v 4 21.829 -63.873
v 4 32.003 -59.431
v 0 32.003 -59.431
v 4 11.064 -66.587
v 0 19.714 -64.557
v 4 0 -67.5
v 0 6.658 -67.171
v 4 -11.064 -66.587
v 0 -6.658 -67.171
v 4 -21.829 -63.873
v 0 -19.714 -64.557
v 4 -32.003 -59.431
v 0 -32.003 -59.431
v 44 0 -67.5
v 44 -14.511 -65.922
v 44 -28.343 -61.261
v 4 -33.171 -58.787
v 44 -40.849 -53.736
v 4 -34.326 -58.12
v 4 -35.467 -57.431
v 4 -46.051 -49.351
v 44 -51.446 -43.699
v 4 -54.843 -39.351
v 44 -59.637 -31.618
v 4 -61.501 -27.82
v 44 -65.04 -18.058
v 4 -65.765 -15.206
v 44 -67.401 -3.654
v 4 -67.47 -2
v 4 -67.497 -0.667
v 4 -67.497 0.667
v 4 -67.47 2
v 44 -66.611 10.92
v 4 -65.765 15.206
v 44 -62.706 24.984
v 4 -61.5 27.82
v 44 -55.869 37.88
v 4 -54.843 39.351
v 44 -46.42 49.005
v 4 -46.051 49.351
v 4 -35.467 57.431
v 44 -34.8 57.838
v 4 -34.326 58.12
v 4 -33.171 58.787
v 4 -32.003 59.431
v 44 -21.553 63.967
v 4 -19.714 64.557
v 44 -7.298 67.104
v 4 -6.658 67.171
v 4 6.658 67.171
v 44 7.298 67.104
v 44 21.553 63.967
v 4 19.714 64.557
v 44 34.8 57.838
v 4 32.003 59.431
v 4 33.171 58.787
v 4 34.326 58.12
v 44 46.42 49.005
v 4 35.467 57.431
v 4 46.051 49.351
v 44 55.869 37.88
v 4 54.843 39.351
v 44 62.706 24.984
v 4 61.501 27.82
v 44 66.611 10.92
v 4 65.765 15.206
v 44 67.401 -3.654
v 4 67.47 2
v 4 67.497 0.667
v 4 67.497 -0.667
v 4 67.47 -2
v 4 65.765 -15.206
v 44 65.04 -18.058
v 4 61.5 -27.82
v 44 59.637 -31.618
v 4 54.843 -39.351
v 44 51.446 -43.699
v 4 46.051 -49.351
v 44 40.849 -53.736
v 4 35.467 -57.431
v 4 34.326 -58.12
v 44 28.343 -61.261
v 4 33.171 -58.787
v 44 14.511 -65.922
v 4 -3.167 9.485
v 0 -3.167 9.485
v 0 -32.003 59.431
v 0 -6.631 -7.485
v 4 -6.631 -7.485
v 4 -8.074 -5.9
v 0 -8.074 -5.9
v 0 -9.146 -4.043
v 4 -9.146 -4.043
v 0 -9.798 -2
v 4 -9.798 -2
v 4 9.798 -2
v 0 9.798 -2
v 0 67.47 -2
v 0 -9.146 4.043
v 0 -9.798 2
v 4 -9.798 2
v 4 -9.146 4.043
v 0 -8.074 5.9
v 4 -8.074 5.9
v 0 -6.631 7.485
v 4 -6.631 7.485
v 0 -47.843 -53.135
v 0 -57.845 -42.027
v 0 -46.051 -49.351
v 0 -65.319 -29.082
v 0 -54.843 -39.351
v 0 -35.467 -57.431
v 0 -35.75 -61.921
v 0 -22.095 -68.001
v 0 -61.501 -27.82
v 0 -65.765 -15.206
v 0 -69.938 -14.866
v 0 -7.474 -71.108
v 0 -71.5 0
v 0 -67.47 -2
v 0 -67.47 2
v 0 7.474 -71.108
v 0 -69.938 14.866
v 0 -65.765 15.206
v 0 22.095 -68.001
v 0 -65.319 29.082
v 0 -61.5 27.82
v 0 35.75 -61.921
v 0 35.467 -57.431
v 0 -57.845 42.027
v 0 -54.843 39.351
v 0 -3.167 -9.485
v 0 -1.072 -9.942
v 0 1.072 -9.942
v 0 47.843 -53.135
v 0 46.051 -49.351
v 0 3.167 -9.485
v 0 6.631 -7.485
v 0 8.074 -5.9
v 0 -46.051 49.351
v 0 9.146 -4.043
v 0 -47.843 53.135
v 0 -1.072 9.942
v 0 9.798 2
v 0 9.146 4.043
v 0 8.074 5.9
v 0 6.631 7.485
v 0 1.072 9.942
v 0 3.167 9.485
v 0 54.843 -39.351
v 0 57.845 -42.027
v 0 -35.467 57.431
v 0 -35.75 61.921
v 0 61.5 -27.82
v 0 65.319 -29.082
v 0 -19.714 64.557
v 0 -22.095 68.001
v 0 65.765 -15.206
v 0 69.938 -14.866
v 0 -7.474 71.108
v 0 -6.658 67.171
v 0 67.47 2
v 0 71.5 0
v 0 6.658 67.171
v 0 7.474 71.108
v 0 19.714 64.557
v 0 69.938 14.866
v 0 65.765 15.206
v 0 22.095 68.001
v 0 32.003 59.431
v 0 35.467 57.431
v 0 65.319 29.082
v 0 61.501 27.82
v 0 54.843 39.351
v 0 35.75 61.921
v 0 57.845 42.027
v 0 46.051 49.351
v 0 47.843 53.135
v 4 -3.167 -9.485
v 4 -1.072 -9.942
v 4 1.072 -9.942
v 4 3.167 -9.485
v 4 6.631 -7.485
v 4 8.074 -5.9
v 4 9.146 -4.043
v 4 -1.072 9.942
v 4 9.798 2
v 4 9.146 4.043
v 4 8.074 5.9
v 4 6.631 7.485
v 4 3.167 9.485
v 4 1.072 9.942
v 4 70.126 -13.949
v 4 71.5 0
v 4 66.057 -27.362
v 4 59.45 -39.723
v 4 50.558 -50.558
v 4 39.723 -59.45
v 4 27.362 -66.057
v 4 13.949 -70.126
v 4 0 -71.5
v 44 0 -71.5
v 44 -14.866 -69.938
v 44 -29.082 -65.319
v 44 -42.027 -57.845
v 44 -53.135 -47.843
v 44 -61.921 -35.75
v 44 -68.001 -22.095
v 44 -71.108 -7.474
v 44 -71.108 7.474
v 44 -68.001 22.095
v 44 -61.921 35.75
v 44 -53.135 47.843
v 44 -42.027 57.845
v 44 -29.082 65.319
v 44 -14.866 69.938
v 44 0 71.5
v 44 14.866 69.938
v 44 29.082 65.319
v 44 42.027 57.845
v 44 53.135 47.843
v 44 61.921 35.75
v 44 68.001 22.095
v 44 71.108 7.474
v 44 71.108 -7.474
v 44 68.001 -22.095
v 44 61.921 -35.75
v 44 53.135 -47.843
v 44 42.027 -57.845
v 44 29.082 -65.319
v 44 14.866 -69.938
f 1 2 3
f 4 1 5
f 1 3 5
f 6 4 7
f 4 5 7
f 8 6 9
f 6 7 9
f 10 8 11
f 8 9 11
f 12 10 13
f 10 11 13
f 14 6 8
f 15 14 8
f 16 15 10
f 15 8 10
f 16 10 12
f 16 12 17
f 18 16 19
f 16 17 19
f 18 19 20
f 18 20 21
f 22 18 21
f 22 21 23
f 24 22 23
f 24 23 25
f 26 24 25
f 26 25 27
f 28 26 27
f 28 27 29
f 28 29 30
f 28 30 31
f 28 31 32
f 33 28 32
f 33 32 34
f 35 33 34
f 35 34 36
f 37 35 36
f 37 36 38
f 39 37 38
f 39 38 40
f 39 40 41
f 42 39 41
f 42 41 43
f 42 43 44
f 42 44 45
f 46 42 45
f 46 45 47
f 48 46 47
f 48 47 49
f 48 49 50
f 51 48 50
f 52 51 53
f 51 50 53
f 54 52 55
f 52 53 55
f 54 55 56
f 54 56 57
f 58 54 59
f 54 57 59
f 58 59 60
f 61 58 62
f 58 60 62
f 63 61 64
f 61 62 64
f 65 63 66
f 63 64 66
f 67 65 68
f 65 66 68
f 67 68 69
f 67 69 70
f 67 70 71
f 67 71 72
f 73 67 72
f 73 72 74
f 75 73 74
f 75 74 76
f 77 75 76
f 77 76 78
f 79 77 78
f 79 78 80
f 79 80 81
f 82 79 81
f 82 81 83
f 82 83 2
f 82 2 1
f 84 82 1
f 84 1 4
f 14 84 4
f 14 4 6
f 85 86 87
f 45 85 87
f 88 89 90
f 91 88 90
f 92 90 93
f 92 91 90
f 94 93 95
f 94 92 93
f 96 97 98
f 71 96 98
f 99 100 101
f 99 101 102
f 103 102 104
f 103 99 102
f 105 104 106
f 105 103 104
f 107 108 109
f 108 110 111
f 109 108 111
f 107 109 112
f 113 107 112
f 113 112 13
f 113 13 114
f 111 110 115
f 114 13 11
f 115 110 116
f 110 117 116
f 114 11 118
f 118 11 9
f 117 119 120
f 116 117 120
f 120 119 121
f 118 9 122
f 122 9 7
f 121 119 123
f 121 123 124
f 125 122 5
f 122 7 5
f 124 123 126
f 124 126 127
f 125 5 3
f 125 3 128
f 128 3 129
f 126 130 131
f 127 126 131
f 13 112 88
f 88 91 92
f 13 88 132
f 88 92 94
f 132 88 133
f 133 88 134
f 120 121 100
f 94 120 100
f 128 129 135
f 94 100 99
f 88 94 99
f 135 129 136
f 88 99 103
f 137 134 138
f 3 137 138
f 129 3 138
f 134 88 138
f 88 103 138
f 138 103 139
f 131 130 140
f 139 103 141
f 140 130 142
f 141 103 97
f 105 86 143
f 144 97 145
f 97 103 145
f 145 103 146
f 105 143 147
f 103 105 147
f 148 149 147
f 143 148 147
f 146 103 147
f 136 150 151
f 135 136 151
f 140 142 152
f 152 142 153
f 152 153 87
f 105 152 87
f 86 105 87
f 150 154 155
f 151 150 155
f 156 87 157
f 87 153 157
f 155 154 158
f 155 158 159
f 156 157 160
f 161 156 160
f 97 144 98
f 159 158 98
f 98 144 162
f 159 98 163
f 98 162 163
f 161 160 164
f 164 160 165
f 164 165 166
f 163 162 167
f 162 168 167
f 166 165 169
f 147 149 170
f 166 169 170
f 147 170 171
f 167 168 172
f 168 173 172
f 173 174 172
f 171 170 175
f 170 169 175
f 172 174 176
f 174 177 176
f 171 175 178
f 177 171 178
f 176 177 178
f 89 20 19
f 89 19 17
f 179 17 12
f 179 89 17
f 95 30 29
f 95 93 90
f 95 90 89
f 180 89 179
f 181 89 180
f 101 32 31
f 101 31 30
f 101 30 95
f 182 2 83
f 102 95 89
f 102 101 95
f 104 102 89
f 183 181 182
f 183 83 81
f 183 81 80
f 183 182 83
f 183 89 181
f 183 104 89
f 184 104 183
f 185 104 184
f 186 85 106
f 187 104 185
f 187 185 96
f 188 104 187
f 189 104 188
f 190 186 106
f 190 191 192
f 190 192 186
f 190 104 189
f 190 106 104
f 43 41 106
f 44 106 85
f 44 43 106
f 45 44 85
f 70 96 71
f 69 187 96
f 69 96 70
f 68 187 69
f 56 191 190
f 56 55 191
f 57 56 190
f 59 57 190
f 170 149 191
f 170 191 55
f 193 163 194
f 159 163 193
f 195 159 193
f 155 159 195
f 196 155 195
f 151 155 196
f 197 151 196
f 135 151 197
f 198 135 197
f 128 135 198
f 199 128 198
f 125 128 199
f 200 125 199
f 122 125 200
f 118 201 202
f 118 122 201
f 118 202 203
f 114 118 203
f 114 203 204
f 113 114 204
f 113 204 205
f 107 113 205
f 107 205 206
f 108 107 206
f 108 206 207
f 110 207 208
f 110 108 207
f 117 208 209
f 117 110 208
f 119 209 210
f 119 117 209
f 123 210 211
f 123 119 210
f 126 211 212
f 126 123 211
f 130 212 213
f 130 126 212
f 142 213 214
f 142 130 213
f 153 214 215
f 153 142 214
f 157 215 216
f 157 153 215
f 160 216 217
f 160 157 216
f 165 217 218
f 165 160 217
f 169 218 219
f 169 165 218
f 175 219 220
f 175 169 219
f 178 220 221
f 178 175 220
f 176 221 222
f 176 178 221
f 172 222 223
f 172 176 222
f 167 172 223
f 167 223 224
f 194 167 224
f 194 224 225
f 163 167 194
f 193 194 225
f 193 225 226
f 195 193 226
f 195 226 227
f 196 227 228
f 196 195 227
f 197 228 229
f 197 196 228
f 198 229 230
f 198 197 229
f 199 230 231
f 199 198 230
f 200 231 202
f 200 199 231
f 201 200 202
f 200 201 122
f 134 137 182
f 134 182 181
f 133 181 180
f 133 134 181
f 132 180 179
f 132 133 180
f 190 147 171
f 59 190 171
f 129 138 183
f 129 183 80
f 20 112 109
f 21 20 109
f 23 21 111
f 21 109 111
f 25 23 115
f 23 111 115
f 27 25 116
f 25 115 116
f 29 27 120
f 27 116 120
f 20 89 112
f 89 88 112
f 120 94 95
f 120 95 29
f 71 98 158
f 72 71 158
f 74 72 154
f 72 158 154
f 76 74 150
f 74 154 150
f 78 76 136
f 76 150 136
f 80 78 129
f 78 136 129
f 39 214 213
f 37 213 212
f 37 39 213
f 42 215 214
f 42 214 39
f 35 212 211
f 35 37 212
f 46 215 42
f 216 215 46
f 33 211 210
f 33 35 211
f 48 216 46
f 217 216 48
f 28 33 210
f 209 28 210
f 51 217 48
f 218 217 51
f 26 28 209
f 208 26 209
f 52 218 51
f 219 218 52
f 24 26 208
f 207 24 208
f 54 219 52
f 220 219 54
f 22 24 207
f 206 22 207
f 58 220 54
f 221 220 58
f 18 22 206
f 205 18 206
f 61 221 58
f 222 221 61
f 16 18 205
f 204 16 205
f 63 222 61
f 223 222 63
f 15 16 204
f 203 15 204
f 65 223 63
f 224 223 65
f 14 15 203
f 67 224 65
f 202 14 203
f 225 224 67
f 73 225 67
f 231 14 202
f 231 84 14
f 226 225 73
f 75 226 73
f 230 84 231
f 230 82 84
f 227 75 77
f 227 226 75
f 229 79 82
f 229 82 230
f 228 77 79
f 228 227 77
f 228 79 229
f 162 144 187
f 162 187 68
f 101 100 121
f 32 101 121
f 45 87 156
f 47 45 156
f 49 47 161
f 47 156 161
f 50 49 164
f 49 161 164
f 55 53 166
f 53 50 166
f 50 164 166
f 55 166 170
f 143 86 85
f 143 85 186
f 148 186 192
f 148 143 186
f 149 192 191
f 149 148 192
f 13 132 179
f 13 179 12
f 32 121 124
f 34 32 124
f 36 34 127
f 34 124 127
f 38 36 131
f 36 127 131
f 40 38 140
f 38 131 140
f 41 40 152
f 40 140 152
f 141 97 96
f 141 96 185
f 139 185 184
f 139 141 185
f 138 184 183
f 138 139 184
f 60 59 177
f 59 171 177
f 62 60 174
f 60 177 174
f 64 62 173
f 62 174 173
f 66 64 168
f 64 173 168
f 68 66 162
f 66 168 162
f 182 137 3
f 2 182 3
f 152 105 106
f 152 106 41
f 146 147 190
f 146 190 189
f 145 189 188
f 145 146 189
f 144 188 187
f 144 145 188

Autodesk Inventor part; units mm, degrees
ref_plane "YZ Plane" through (0, 0, 0) normal (1, 0, 0) x (0, 1, 0)
ref_plane "XZ Plane" through (0, 0, 0) normal (0, 1, 0) x (-1, 0, 0)
ref_plane "XY Plane" through (0, 0, 0) normal (0, 0, 1) x (1, 0, 0)
sketch "Sketch1" plane through (0, 0, 0) normal (1, 0, 0) x (0, 1, 0)
  arc A0 (35.4672, -57.431) -> (67.4704, -2) centre (0, 0) ccw
  circle A1 centre (0, 0) radius 71.5
  arc A2 (3.1669, 9.4853) -> (-3.1669, 9.4853) centre (0, 0) ccw
  line L0 (10, 0) -> (67.5, 0) construction
  line L1 (9.798, 2) -> (67.4704, 2)
  line L2 (9.798, -2) -> (67.4704, -2)
  line L3 (3.1669, 9.4853) -> (32.0031, 59.431)
  line L4 (6.631, 7.4853) -> (35.4672, 57.431)
  line L5 (-6.631, 7.4853) -> (-35.4672, 57.431)
  line L6 (-3.1669, 9.4853) -> (-32.0031, 59.431)
  line L7 (-9.798, -2) -> (-67.4704, -2)
  line L8 (-9.798, 2) -> (-67.4704, 2)
  line L9 (-3.1669, -9.4853) -> (-32.0031, -59.431)
  line L10 (-6.631, -7.4853) -> (-35.4672, -57.431)
  line L11 (6.631, -7.4853) -> (35.4672, -57.431)
  line L12 (3.1669, -9.4853) -> (32.0031, -59.431)
  arc A3 (6.631, 7.4853) -> (3.1669, 9.4853) centre (0, 0) ccw
  arc A4 (-6.631, 7.4853) -> (-9.798, 2) centre (0, 0) ccw
  arc A5 (-3.1669, 9.4853) -> (-6.631, 7.4853) centre (0, 0) ccw
  arc A6 (-9.798, 2) -> (-9.798, -2) centre (0, 0) ccw
  arc A7 (-9.798, -2) -> (-6.631, -7.4853) centre (0, 0) ccw
  arc A8 (-6.631, -7.4853) -> (-3.1669, -9.4853) centre (0, 0) ccw
  arc A9 (-3.1669, -9.4853) -> (3.1669, -9.4853) centre (0, 0) ccw
  arc A10 (3.1669, -9.4853) -> (6.631, -7.4853) centre (0, 0) ccw
  arc A11 (6.631, -7.4853) -> (6.631, 7.4853) centre (0, 0) ccw
  arc A12 (32.0031, -59.431) -> (35.4672, -57.431) centre (0, 0) ccw
  arc A13 (67.4704, -2) -> (67.4704, 2) centre (0, 0) ccw construction
  arc A14 (35.4672, 57.431) -> (32.0031, 59.431) centre (0, 0) ccw construction
  arc A15 (32.0031, 59.431) -> (-32.0031, 59.431) centre (0, 0) ccw
  arc A16 (-32.0031, 59.431) -> (-35.4672, 57.431) centre (0, 0) ccw construction
  arc A17 (-35.4672, 57.431) -> (-67.4704, 2) centre (0, 0) ccw
  arc A18 (-67.4704, 2) -> (-67.4704, -2) centre (0, 0) ccw construction
  arc A19 (-67.4704, -2) -> (-35.4672, -57.431) centre (0, 0) ccw
  arc A20 (-35.4672, -57.431) -> (-32.0031, -59.431) centre (0, 0) ccw construction
  arc A21 (-32.0031, -59.431) -> (32.0031, -59.431) centre (0, 0) ccw
  arc A22 (67.4704, 2) -> (35.4672, 57.431) centre (0, 0) ccw
  dimension "d0" = 135
  dimension "d1" = 4
  dimension "d2" = 20
  dimension "d3" = 2
  dimension "d4" = 2
  dimension "d7" = 360
extrude "Extrusion1" add sketch "Sketch1" along normal blind 4 contours A12 L12 A10 L11 | A10 A9 A8 A7 A6 A4 A5 A2 A3 A11 | A1
sketch "Sketch2" plane through (4, 0, 0) normal (1, 0, 0) x (0, 0, -1)
  circle A0 centre (0, 0) radius 71.5 projected
  line L0 (-59.431, 32.0031) -> (-9.4853, 3.1669) projected
  circle A1 centre (0, 0) radius 67.5
extrude "Extrusion2" add sketch "Sketch2" along normal blind 40
properties part number "SuportMotor"
